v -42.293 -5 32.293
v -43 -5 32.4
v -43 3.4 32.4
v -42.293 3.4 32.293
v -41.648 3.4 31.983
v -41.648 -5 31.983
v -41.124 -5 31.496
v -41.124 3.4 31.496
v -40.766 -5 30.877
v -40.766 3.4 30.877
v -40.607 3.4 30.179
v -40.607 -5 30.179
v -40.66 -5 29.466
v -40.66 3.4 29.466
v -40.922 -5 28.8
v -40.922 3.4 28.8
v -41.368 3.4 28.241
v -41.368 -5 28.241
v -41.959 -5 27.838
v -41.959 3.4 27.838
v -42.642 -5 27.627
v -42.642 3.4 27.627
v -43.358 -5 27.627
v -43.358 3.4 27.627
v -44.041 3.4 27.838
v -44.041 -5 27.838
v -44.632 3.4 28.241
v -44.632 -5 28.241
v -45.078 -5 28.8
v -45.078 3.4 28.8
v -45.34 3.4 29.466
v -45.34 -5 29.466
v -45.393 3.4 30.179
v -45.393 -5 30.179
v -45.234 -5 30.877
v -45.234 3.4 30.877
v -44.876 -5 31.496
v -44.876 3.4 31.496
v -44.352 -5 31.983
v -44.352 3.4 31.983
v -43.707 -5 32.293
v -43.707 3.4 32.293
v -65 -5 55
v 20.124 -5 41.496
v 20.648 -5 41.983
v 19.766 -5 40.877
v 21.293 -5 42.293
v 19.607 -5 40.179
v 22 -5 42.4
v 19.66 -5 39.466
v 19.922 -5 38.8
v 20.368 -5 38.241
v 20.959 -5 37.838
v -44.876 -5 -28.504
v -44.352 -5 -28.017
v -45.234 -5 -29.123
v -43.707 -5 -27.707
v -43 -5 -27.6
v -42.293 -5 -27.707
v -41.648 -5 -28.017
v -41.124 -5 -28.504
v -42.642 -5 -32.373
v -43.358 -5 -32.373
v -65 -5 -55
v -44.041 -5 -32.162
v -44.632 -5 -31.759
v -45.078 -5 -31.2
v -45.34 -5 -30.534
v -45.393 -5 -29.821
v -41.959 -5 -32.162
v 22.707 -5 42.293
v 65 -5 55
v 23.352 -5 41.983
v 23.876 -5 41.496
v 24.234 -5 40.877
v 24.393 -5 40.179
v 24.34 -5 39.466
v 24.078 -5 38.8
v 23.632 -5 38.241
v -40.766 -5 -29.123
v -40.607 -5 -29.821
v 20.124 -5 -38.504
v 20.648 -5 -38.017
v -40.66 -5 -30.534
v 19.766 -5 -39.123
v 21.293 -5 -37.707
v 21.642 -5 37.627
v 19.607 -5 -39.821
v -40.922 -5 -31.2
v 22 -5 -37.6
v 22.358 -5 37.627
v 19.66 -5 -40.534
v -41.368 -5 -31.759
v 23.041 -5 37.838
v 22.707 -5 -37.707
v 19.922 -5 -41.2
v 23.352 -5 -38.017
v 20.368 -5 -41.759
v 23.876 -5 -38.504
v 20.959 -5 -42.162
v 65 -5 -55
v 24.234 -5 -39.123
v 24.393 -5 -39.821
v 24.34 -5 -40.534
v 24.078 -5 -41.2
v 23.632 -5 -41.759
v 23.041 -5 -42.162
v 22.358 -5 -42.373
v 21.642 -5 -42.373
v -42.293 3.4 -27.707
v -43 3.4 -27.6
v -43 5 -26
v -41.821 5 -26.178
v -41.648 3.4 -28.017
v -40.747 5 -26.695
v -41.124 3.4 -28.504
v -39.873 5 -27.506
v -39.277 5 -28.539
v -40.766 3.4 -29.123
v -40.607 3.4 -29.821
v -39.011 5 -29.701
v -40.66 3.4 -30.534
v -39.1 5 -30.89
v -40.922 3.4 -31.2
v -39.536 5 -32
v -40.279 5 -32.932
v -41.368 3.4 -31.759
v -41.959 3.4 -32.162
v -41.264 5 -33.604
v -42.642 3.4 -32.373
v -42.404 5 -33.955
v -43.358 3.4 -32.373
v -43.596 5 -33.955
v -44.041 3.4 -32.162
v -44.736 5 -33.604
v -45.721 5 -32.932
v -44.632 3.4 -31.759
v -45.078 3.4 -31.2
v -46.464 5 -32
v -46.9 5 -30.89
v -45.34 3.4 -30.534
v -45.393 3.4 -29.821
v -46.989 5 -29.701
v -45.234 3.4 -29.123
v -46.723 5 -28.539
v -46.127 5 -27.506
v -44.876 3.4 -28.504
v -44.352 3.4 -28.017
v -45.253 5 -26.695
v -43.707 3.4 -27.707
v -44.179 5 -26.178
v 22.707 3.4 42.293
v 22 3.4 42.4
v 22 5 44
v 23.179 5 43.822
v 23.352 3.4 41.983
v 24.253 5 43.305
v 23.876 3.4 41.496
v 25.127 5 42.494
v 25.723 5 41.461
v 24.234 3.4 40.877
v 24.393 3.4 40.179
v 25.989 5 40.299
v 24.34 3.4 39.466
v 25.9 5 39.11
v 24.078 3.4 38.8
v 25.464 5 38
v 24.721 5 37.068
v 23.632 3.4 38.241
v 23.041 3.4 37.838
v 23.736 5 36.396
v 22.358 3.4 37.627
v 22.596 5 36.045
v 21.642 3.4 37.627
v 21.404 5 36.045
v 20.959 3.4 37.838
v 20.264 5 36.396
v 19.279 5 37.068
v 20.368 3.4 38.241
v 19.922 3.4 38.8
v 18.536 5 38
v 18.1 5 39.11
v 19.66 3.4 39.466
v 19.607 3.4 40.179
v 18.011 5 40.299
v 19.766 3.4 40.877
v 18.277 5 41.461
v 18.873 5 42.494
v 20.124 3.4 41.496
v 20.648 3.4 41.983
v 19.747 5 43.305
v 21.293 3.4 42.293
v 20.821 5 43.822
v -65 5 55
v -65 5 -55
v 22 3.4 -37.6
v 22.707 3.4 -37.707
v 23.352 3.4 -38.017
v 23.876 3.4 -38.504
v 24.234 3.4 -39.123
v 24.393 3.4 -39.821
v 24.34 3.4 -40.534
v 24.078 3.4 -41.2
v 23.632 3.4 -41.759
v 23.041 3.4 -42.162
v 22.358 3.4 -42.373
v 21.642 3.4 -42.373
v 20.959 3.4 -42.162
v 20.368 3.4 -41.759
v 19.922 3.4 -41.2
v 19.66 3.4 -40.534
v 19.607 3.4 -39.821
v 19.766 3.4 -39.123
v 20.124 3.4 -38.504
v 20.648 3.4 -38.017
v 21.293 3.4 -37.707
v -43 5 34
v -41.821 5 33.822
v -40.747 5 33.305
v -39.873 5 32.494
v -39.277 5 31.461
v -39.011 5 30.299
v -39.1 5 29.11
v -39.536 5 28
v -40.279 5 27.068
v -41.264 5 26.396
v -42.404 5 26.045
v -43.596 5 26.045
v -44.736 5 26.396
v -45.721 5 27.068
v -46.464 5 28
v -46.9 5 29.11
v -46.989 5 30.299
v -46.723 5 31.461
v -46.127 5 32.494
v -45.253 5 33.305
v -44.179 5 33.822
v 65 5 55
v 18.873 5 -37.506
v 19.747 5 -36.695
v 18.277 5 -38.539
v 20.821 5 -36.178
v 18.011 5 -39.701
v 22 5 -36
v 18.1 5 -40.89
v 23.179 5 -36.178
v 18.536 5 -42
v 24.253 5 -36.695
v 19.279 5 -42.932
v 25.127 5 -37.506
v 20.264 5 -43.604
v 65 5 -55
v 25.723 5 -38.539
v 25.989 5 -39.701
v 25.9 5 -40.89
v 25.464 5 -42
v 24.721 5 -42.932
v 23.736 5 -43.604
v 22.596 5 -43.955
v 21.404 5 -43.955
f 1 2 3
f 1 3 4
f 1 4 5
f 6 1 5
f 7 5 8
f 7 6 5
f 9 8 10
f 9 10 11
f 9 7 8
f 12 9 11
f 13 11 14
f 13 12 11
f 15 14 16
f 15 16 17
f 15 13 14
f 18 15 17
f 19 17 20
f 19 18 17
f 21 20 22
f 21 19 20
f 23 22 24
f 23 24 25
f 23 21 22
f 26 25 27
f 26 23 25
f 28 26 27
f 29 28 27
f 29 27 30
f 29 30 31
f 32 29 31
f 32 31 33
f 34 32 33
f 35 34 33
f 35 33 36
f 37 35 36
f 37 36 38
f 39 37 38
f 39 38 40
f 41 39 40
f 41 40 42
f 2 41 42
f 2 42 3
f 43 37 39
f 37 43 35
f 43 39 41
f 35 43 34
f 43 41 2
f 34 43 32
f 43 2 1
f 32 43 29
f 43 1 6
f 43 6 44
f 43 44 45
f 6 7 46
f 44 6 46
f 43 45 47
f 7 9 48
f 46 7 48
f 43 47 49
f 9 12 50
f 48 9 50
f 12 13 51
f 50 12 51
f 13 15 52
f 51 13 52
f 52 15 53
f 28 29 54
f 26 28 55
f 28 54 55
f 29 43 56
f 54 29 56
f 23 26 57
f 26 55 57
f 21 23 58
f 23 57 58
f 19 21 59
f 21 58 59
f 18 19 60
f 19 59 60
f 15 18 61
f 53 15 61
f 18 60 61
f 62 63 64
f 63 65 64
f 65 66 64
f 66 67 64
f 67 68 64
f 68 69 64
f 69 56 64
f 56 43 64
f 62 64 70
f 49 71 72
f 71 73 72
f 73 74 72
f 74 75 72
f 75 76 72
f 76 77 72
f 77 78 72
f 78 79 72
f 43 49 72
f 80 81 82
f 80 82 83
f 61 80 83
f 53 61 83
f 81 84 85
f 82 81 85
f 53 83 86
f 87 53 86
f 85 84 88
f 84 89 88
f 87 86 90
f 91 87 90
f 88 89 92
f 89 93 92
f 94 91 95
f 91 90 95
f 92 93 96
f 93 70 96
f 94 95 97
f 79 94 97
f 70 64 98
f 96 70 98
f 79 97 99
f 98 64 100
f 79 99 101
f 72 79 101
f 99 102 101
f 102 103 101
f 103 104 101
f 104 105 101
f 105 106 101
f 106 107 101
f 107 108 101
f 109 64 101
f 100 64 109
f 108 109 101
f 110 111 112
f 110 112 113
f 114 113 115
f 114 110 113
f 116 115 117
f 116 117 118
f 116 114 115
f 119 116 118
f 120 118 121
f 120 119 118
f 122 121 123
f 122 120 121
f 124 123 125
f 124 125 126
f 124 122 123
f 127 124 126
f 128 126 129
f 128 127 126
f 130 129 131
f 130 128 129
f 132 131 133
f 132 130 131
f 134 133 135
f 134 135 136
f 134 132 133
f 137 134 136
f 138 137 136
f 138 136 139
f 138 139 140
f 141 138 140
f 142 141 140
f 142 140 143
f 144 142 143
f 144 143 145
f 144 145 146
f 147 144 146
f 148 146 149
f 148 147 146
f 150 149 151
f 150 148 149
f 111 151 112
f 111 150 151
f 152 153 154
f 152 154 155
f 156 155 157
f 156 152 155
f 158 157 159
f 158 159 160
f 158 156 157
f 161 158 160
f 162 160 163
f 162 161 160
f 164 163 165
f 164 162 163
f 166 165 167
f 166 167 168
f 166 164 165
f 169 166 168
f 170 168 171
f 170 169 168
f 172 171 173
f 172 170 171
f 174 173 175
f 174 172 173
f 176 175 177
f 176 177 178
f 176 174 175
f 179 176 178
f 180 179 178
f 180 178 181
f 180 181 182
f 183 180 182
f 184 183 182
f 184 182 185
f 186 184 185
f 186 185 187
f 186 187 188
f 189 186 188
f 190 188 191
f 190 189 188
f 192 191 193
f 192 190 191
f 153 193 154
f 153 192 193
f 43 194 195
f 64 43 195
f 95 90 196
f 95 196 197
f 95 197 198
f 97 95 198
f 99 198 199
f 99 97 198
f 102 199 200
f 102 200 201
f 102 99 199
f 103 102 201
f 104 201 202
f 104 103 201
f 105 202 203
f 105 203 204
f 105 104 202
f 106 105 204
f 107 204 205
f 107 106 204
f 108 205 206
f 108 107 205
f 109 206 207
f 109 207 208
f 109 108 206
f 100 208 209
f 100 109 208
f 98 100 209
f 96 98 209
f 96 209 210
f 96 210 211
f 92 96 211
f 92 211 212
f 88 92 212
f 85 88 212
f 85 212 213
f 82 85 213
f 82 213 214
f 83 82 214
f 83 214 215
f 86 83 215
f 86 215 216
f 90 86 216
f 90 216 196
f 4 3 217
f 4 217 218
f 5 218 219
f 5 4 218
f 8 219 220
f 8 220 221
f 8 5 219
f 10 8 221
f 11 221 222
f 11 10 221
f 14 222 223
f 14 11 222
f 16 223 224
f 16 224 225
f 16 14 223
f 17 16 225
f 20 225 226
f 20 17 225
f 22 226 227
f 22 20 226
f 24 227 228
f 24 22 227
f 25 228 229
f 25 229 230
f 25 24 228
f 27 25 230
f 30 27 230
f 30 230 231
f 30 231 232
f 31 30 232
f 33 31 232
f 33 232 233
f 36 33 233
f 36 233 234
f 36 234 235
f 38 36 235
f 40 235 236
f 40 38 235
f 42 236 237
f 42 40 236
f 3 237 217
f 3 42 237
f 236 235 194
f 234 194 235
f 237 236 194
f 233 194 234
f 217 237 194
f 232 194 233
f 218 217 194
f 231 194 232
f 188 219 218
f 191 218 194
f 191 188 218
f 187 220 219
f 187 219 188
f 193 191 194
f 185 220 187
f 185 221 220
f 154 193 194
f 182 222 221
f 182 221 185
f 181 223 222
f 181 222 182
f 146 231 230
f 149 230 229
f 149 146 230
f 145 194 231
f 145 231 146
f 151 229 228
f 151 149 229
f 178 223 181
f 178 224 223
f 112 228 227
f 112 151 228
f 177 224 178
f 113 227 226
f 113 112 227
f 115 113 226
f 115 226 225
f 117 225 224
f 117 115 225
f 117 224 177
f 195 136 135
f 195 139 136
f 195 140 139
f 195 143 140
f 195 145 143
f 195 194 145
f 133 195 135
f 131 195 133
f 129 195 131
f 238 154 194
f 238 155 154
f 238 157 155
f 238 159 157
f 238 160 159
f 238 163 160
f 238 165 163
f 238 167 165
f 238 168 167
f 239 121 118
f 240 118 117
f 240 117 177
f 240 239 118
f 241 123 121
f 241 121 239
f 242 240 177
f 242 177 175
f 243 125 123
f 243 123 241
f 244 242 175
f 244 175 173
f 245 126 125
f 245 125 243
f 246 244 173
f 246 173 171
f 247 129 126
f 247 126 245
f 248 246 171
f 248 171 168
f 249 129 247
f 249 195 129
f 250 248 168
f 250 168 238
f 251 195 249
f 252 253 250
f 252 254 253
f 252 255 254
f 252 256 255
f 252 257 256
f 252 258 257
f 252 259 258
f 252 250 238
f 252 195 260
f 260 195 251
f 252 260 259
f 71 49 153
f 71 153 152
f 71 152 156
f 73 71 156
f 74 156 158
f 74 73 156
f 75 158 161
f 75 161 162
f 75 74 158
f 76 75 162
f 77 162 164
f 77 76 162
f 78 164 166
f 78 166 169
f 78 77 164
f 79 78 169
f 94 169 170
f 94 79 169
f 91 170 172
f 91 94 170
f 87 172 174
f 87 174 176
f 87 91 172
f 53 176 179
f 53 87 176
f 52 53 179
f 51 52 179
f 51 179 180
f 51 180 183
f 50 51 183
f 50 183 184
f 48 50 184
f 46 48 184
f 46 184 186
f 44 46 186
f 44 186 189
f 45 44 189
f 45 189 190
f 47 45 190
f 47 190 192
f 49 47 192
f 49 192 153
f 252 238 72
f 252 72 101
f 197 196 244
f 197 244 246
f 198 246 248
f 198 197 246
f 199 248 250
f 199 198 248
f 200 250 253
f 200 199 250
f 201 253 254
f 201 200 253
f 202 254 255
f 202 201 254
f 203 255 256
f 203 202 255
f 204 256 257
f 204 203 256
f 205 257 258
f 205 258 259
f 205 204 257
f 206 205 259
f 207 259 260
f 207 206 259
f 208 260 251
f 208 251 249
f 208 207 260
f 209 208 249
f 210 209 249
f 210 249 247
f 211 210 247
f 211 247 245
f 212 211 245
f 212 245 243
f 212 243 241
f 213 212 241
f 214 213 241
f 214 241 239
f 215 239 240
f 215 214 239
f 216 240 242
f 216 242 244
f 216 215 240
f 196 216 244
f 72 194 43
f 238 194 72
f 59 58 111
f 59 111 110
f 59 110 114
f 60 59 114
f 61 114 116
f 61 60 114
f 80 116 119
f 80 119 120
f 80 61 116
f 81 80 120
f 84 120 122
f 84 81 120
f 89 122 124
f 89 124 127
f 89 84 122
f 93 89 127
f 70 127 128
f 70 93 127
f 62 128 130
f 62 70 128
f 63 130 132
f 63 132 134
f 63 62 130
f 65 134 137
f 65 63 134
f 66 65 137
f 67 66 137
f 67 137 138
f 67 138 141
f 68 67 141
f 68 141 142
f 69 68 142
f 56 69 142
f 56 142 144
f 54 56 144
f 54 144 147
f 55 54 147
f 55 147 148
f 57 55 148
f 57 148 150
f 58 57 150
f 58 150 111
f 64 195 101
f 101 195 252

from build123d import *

# Parameters (mm, degrees)
SKETCH_2_W      = 130
SKETCH_2_H      = 110
SKETCH_2_R      = 2.4
EXTRUDE_1_DEPTH = 5
CHAMFER_1_SIZE  = 1.6


with BuildPart() as part:
    # Эскиз2 → Бобышка-Вытянуть1 (new, symmetric)
    with BuildSketch(Plane(origin=(0, 0, 0), x_dir=(1, 0, 0), z_dir=(0, 1, 0))):
        Rectangle(SKETCH_2_W, SKETCH_2_H)
        with Locations(Location((-43, 30, 0), (0, 0, 270))):
            Circle(SKETCH_2_R, mode=Mode.SUBTRACT)
        with Locations(Location((-43, -30, 0), (0, 0, 270))):
            Circle(SKETCH_2_R, mode=Mode.SUBTRACT)
        with Locations(Location((22, 40, 0), (0, 0, 270))):
            Circle(SKETCH_2_R, mode=Mode.SUBTRACT)
        with Locations(Location((22, -40, 0), (0, 0, 270))):
            Circle(SKETCH_2_R, mode=Mode.SUBTRACT)
    extrude(amount=EXTRUDE_1_DEPTH, both=True)

    # Фаска1
    chamfer_1_edges = [part.edges().sort_by_distance(p)[0] for p in [
        (-43, 5, -32.4),
        (-43, 5, 27.6),
        (22, 5, -42.4),
        (22, 5, 37.6),
    ]]
    chamfer(chamfer_1_edges, length=CHAMFER_1_SIZE)


solid = part.part
